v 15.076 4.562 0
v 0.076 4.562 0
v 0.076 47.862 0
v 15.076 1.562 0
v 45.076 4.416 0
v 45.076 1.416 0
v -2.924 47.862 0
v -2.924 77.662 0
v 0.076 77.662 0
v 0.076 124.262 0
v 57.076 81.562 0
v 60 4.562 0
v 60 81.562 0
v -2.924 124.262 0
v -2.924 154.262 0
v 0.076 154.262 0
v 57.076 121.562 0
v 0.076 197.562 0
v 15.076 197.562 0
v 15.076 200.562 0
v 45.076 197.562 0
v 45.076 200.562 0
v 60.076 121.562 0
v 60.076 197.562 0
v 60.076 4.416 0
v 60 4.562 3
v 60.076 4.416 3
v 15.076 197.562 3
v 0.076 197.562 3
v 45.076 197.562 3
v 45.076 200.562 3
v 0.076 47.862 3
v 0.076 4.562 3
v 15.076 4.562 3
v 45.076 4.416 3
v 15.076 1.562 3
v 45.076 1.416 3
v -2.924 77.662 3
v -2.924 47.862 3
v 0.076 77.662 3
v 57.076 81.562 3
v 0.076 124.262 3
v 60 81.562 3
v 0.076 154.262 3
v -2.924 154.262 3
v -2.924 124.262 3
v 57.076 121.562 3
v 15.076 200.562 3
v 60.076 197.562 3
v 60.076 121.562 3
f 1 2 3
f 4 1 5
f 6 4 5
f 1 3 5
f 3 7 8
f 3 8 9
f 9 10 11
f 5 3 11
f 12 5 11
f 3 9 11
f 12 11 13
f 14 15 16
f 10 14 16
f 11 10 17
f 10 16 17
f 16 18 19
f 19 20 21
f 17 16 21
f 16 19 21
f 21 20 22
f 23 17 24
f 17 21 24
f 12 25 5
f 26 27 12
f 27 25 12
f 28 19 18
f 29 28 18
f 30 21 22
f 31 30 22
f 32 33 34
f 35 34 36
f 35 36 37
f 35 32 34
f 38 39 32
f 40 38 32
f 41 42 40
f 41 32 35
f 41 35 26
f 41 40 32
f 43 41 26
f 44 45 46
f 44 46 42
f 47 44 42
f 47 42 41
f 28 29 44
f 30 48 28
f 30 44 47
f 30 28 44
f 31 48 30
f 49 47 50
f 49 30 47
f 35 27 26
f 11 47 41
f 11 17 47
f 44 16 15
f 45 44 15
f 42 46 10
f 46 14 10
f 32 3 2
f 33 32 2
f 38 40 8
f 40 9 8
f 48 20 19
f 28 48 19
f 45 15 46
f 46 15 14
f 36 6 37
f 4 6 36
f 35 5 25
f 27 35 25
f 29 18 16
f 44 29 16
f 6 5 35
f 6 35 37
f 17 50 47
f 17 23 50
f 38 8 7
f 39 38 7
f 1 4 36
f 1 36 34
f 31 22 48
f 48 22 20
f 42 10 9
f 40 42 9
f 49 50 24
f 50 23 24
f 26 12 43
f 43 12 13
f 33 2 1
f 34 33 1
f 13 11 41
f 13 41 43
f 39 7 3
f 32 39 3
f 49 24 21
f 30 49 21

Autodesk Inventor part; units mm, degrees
ref_plane "YZ Plane" through (0, 0, 0) normal (1, 0, 0) x (0, 1, 0)
ref_plane "XZ Plane" through (0, 0, 0) normal (0, 1, 0) x (-1, 0, 0)
ref_plane "XY Plane" through (0, 0, 0) normal (0, 0, 1) x (1, 0, 0)
sketch "Sketch1" plane through (0, 0, 0) normal (0, 0, 1) x (1, 0, 0)
  line L0 (60.0759, 197.5616) -> (45.0759, 197.5616)
  line L1 (45.0759, 197.5616) -> (45.0759, 200.5616)
  line L2 (15.0759, 200.5616) -> (15.0759, 197.5616)
  line L3 (45.0759, 200.5616) -> (15.0759, 200.5616)
  line L4 (15.0759, 197.5616) -> (0.0759, 197.5616)
  line L5 (57.0759, 81.5616) -> (60, 81.5616)
  line L6 (0.0759, 77.6616) -> (-2.9241, 77.6616)
  line L7 (-2.9241, 77.6616) -> (-2.9241, 47.8616)
  line L8 (-2.9241, 47.8616) -> (0.0759, 47.8616)
  line L9 (60, 4.5616) -> (60, 81.5616)
  line L10 (0.0759, 47.8616) -> (0.0759, 4.5616)
  line L11 (0.0759, 4.5616) -> (15.0759, 4.5616)
  line L12 (60.0757, 4.4159) -> (60, 4.5616)
  line L13 (45.0759, 4.4159) -> (60.0757, 4.4159)
  line L14 (45.0759, 4.4159) -> (45.0759, 1.4159)
  line L15 (45.0759, 1.4159) -> (15.0759, 1.5616)
  line L16 (15.0759, 1.5616) -> (15.0759, 4.5616)
  line L17 (0.0759, 197.5616) -> (0.0759, 154.2616)
  line L18 (0.0759, 154.2616) -> (-2.9241, 154.2616)
  line L19 (60.0759, 121.5616) -> (60.0759, 197.5616)
  line L20 (60.0759, 121.5616) -> (57.0759, 121.5616)
  line L21 (-2.9241, 124.2616) -> (0.0759, 124.2616)
  line L22 (-2.9241, 154.2616) -> (-2.9241, 124.2616)
  line L23 (0.0759, 124.2616) -> (0.0759, 77.6616)
  line L24 (57.0759, 121.5616) -> (57.0759, 81.5616)
  point P0 (0, 0)
  dimension "d47" = 193
  dimension "d48" = 60
  dimension "d49" = 3
  dimension "d50" = 30
  dimension "d51" = 15
  dimension "d52" = 3
  dimension "d53" = 3
  dimension "d54" = 15
  dimension "d55" = 3
  dimension "d56" = 3
  dimension "d57" = 3
  dimension "d58" = 3
  dimension "d59" = 15
  dimension "d60" = 40
  dimension "d61" = 3
  dimension "d62" = 77
  dimension "d63" = 3
  dimension "d64" = 76
  dimension "d65" = 199.1457
  dimension "d66" = 43.3
  dimension "d67" = 46.6
  dimension "d68" = 43.3
  dimension "d69" = 30
  dimension "d70" = 29.8
extrude "Extrusion1" add sketch "Sketch1" along normal blind 3
properties part number "sampingkiri"
